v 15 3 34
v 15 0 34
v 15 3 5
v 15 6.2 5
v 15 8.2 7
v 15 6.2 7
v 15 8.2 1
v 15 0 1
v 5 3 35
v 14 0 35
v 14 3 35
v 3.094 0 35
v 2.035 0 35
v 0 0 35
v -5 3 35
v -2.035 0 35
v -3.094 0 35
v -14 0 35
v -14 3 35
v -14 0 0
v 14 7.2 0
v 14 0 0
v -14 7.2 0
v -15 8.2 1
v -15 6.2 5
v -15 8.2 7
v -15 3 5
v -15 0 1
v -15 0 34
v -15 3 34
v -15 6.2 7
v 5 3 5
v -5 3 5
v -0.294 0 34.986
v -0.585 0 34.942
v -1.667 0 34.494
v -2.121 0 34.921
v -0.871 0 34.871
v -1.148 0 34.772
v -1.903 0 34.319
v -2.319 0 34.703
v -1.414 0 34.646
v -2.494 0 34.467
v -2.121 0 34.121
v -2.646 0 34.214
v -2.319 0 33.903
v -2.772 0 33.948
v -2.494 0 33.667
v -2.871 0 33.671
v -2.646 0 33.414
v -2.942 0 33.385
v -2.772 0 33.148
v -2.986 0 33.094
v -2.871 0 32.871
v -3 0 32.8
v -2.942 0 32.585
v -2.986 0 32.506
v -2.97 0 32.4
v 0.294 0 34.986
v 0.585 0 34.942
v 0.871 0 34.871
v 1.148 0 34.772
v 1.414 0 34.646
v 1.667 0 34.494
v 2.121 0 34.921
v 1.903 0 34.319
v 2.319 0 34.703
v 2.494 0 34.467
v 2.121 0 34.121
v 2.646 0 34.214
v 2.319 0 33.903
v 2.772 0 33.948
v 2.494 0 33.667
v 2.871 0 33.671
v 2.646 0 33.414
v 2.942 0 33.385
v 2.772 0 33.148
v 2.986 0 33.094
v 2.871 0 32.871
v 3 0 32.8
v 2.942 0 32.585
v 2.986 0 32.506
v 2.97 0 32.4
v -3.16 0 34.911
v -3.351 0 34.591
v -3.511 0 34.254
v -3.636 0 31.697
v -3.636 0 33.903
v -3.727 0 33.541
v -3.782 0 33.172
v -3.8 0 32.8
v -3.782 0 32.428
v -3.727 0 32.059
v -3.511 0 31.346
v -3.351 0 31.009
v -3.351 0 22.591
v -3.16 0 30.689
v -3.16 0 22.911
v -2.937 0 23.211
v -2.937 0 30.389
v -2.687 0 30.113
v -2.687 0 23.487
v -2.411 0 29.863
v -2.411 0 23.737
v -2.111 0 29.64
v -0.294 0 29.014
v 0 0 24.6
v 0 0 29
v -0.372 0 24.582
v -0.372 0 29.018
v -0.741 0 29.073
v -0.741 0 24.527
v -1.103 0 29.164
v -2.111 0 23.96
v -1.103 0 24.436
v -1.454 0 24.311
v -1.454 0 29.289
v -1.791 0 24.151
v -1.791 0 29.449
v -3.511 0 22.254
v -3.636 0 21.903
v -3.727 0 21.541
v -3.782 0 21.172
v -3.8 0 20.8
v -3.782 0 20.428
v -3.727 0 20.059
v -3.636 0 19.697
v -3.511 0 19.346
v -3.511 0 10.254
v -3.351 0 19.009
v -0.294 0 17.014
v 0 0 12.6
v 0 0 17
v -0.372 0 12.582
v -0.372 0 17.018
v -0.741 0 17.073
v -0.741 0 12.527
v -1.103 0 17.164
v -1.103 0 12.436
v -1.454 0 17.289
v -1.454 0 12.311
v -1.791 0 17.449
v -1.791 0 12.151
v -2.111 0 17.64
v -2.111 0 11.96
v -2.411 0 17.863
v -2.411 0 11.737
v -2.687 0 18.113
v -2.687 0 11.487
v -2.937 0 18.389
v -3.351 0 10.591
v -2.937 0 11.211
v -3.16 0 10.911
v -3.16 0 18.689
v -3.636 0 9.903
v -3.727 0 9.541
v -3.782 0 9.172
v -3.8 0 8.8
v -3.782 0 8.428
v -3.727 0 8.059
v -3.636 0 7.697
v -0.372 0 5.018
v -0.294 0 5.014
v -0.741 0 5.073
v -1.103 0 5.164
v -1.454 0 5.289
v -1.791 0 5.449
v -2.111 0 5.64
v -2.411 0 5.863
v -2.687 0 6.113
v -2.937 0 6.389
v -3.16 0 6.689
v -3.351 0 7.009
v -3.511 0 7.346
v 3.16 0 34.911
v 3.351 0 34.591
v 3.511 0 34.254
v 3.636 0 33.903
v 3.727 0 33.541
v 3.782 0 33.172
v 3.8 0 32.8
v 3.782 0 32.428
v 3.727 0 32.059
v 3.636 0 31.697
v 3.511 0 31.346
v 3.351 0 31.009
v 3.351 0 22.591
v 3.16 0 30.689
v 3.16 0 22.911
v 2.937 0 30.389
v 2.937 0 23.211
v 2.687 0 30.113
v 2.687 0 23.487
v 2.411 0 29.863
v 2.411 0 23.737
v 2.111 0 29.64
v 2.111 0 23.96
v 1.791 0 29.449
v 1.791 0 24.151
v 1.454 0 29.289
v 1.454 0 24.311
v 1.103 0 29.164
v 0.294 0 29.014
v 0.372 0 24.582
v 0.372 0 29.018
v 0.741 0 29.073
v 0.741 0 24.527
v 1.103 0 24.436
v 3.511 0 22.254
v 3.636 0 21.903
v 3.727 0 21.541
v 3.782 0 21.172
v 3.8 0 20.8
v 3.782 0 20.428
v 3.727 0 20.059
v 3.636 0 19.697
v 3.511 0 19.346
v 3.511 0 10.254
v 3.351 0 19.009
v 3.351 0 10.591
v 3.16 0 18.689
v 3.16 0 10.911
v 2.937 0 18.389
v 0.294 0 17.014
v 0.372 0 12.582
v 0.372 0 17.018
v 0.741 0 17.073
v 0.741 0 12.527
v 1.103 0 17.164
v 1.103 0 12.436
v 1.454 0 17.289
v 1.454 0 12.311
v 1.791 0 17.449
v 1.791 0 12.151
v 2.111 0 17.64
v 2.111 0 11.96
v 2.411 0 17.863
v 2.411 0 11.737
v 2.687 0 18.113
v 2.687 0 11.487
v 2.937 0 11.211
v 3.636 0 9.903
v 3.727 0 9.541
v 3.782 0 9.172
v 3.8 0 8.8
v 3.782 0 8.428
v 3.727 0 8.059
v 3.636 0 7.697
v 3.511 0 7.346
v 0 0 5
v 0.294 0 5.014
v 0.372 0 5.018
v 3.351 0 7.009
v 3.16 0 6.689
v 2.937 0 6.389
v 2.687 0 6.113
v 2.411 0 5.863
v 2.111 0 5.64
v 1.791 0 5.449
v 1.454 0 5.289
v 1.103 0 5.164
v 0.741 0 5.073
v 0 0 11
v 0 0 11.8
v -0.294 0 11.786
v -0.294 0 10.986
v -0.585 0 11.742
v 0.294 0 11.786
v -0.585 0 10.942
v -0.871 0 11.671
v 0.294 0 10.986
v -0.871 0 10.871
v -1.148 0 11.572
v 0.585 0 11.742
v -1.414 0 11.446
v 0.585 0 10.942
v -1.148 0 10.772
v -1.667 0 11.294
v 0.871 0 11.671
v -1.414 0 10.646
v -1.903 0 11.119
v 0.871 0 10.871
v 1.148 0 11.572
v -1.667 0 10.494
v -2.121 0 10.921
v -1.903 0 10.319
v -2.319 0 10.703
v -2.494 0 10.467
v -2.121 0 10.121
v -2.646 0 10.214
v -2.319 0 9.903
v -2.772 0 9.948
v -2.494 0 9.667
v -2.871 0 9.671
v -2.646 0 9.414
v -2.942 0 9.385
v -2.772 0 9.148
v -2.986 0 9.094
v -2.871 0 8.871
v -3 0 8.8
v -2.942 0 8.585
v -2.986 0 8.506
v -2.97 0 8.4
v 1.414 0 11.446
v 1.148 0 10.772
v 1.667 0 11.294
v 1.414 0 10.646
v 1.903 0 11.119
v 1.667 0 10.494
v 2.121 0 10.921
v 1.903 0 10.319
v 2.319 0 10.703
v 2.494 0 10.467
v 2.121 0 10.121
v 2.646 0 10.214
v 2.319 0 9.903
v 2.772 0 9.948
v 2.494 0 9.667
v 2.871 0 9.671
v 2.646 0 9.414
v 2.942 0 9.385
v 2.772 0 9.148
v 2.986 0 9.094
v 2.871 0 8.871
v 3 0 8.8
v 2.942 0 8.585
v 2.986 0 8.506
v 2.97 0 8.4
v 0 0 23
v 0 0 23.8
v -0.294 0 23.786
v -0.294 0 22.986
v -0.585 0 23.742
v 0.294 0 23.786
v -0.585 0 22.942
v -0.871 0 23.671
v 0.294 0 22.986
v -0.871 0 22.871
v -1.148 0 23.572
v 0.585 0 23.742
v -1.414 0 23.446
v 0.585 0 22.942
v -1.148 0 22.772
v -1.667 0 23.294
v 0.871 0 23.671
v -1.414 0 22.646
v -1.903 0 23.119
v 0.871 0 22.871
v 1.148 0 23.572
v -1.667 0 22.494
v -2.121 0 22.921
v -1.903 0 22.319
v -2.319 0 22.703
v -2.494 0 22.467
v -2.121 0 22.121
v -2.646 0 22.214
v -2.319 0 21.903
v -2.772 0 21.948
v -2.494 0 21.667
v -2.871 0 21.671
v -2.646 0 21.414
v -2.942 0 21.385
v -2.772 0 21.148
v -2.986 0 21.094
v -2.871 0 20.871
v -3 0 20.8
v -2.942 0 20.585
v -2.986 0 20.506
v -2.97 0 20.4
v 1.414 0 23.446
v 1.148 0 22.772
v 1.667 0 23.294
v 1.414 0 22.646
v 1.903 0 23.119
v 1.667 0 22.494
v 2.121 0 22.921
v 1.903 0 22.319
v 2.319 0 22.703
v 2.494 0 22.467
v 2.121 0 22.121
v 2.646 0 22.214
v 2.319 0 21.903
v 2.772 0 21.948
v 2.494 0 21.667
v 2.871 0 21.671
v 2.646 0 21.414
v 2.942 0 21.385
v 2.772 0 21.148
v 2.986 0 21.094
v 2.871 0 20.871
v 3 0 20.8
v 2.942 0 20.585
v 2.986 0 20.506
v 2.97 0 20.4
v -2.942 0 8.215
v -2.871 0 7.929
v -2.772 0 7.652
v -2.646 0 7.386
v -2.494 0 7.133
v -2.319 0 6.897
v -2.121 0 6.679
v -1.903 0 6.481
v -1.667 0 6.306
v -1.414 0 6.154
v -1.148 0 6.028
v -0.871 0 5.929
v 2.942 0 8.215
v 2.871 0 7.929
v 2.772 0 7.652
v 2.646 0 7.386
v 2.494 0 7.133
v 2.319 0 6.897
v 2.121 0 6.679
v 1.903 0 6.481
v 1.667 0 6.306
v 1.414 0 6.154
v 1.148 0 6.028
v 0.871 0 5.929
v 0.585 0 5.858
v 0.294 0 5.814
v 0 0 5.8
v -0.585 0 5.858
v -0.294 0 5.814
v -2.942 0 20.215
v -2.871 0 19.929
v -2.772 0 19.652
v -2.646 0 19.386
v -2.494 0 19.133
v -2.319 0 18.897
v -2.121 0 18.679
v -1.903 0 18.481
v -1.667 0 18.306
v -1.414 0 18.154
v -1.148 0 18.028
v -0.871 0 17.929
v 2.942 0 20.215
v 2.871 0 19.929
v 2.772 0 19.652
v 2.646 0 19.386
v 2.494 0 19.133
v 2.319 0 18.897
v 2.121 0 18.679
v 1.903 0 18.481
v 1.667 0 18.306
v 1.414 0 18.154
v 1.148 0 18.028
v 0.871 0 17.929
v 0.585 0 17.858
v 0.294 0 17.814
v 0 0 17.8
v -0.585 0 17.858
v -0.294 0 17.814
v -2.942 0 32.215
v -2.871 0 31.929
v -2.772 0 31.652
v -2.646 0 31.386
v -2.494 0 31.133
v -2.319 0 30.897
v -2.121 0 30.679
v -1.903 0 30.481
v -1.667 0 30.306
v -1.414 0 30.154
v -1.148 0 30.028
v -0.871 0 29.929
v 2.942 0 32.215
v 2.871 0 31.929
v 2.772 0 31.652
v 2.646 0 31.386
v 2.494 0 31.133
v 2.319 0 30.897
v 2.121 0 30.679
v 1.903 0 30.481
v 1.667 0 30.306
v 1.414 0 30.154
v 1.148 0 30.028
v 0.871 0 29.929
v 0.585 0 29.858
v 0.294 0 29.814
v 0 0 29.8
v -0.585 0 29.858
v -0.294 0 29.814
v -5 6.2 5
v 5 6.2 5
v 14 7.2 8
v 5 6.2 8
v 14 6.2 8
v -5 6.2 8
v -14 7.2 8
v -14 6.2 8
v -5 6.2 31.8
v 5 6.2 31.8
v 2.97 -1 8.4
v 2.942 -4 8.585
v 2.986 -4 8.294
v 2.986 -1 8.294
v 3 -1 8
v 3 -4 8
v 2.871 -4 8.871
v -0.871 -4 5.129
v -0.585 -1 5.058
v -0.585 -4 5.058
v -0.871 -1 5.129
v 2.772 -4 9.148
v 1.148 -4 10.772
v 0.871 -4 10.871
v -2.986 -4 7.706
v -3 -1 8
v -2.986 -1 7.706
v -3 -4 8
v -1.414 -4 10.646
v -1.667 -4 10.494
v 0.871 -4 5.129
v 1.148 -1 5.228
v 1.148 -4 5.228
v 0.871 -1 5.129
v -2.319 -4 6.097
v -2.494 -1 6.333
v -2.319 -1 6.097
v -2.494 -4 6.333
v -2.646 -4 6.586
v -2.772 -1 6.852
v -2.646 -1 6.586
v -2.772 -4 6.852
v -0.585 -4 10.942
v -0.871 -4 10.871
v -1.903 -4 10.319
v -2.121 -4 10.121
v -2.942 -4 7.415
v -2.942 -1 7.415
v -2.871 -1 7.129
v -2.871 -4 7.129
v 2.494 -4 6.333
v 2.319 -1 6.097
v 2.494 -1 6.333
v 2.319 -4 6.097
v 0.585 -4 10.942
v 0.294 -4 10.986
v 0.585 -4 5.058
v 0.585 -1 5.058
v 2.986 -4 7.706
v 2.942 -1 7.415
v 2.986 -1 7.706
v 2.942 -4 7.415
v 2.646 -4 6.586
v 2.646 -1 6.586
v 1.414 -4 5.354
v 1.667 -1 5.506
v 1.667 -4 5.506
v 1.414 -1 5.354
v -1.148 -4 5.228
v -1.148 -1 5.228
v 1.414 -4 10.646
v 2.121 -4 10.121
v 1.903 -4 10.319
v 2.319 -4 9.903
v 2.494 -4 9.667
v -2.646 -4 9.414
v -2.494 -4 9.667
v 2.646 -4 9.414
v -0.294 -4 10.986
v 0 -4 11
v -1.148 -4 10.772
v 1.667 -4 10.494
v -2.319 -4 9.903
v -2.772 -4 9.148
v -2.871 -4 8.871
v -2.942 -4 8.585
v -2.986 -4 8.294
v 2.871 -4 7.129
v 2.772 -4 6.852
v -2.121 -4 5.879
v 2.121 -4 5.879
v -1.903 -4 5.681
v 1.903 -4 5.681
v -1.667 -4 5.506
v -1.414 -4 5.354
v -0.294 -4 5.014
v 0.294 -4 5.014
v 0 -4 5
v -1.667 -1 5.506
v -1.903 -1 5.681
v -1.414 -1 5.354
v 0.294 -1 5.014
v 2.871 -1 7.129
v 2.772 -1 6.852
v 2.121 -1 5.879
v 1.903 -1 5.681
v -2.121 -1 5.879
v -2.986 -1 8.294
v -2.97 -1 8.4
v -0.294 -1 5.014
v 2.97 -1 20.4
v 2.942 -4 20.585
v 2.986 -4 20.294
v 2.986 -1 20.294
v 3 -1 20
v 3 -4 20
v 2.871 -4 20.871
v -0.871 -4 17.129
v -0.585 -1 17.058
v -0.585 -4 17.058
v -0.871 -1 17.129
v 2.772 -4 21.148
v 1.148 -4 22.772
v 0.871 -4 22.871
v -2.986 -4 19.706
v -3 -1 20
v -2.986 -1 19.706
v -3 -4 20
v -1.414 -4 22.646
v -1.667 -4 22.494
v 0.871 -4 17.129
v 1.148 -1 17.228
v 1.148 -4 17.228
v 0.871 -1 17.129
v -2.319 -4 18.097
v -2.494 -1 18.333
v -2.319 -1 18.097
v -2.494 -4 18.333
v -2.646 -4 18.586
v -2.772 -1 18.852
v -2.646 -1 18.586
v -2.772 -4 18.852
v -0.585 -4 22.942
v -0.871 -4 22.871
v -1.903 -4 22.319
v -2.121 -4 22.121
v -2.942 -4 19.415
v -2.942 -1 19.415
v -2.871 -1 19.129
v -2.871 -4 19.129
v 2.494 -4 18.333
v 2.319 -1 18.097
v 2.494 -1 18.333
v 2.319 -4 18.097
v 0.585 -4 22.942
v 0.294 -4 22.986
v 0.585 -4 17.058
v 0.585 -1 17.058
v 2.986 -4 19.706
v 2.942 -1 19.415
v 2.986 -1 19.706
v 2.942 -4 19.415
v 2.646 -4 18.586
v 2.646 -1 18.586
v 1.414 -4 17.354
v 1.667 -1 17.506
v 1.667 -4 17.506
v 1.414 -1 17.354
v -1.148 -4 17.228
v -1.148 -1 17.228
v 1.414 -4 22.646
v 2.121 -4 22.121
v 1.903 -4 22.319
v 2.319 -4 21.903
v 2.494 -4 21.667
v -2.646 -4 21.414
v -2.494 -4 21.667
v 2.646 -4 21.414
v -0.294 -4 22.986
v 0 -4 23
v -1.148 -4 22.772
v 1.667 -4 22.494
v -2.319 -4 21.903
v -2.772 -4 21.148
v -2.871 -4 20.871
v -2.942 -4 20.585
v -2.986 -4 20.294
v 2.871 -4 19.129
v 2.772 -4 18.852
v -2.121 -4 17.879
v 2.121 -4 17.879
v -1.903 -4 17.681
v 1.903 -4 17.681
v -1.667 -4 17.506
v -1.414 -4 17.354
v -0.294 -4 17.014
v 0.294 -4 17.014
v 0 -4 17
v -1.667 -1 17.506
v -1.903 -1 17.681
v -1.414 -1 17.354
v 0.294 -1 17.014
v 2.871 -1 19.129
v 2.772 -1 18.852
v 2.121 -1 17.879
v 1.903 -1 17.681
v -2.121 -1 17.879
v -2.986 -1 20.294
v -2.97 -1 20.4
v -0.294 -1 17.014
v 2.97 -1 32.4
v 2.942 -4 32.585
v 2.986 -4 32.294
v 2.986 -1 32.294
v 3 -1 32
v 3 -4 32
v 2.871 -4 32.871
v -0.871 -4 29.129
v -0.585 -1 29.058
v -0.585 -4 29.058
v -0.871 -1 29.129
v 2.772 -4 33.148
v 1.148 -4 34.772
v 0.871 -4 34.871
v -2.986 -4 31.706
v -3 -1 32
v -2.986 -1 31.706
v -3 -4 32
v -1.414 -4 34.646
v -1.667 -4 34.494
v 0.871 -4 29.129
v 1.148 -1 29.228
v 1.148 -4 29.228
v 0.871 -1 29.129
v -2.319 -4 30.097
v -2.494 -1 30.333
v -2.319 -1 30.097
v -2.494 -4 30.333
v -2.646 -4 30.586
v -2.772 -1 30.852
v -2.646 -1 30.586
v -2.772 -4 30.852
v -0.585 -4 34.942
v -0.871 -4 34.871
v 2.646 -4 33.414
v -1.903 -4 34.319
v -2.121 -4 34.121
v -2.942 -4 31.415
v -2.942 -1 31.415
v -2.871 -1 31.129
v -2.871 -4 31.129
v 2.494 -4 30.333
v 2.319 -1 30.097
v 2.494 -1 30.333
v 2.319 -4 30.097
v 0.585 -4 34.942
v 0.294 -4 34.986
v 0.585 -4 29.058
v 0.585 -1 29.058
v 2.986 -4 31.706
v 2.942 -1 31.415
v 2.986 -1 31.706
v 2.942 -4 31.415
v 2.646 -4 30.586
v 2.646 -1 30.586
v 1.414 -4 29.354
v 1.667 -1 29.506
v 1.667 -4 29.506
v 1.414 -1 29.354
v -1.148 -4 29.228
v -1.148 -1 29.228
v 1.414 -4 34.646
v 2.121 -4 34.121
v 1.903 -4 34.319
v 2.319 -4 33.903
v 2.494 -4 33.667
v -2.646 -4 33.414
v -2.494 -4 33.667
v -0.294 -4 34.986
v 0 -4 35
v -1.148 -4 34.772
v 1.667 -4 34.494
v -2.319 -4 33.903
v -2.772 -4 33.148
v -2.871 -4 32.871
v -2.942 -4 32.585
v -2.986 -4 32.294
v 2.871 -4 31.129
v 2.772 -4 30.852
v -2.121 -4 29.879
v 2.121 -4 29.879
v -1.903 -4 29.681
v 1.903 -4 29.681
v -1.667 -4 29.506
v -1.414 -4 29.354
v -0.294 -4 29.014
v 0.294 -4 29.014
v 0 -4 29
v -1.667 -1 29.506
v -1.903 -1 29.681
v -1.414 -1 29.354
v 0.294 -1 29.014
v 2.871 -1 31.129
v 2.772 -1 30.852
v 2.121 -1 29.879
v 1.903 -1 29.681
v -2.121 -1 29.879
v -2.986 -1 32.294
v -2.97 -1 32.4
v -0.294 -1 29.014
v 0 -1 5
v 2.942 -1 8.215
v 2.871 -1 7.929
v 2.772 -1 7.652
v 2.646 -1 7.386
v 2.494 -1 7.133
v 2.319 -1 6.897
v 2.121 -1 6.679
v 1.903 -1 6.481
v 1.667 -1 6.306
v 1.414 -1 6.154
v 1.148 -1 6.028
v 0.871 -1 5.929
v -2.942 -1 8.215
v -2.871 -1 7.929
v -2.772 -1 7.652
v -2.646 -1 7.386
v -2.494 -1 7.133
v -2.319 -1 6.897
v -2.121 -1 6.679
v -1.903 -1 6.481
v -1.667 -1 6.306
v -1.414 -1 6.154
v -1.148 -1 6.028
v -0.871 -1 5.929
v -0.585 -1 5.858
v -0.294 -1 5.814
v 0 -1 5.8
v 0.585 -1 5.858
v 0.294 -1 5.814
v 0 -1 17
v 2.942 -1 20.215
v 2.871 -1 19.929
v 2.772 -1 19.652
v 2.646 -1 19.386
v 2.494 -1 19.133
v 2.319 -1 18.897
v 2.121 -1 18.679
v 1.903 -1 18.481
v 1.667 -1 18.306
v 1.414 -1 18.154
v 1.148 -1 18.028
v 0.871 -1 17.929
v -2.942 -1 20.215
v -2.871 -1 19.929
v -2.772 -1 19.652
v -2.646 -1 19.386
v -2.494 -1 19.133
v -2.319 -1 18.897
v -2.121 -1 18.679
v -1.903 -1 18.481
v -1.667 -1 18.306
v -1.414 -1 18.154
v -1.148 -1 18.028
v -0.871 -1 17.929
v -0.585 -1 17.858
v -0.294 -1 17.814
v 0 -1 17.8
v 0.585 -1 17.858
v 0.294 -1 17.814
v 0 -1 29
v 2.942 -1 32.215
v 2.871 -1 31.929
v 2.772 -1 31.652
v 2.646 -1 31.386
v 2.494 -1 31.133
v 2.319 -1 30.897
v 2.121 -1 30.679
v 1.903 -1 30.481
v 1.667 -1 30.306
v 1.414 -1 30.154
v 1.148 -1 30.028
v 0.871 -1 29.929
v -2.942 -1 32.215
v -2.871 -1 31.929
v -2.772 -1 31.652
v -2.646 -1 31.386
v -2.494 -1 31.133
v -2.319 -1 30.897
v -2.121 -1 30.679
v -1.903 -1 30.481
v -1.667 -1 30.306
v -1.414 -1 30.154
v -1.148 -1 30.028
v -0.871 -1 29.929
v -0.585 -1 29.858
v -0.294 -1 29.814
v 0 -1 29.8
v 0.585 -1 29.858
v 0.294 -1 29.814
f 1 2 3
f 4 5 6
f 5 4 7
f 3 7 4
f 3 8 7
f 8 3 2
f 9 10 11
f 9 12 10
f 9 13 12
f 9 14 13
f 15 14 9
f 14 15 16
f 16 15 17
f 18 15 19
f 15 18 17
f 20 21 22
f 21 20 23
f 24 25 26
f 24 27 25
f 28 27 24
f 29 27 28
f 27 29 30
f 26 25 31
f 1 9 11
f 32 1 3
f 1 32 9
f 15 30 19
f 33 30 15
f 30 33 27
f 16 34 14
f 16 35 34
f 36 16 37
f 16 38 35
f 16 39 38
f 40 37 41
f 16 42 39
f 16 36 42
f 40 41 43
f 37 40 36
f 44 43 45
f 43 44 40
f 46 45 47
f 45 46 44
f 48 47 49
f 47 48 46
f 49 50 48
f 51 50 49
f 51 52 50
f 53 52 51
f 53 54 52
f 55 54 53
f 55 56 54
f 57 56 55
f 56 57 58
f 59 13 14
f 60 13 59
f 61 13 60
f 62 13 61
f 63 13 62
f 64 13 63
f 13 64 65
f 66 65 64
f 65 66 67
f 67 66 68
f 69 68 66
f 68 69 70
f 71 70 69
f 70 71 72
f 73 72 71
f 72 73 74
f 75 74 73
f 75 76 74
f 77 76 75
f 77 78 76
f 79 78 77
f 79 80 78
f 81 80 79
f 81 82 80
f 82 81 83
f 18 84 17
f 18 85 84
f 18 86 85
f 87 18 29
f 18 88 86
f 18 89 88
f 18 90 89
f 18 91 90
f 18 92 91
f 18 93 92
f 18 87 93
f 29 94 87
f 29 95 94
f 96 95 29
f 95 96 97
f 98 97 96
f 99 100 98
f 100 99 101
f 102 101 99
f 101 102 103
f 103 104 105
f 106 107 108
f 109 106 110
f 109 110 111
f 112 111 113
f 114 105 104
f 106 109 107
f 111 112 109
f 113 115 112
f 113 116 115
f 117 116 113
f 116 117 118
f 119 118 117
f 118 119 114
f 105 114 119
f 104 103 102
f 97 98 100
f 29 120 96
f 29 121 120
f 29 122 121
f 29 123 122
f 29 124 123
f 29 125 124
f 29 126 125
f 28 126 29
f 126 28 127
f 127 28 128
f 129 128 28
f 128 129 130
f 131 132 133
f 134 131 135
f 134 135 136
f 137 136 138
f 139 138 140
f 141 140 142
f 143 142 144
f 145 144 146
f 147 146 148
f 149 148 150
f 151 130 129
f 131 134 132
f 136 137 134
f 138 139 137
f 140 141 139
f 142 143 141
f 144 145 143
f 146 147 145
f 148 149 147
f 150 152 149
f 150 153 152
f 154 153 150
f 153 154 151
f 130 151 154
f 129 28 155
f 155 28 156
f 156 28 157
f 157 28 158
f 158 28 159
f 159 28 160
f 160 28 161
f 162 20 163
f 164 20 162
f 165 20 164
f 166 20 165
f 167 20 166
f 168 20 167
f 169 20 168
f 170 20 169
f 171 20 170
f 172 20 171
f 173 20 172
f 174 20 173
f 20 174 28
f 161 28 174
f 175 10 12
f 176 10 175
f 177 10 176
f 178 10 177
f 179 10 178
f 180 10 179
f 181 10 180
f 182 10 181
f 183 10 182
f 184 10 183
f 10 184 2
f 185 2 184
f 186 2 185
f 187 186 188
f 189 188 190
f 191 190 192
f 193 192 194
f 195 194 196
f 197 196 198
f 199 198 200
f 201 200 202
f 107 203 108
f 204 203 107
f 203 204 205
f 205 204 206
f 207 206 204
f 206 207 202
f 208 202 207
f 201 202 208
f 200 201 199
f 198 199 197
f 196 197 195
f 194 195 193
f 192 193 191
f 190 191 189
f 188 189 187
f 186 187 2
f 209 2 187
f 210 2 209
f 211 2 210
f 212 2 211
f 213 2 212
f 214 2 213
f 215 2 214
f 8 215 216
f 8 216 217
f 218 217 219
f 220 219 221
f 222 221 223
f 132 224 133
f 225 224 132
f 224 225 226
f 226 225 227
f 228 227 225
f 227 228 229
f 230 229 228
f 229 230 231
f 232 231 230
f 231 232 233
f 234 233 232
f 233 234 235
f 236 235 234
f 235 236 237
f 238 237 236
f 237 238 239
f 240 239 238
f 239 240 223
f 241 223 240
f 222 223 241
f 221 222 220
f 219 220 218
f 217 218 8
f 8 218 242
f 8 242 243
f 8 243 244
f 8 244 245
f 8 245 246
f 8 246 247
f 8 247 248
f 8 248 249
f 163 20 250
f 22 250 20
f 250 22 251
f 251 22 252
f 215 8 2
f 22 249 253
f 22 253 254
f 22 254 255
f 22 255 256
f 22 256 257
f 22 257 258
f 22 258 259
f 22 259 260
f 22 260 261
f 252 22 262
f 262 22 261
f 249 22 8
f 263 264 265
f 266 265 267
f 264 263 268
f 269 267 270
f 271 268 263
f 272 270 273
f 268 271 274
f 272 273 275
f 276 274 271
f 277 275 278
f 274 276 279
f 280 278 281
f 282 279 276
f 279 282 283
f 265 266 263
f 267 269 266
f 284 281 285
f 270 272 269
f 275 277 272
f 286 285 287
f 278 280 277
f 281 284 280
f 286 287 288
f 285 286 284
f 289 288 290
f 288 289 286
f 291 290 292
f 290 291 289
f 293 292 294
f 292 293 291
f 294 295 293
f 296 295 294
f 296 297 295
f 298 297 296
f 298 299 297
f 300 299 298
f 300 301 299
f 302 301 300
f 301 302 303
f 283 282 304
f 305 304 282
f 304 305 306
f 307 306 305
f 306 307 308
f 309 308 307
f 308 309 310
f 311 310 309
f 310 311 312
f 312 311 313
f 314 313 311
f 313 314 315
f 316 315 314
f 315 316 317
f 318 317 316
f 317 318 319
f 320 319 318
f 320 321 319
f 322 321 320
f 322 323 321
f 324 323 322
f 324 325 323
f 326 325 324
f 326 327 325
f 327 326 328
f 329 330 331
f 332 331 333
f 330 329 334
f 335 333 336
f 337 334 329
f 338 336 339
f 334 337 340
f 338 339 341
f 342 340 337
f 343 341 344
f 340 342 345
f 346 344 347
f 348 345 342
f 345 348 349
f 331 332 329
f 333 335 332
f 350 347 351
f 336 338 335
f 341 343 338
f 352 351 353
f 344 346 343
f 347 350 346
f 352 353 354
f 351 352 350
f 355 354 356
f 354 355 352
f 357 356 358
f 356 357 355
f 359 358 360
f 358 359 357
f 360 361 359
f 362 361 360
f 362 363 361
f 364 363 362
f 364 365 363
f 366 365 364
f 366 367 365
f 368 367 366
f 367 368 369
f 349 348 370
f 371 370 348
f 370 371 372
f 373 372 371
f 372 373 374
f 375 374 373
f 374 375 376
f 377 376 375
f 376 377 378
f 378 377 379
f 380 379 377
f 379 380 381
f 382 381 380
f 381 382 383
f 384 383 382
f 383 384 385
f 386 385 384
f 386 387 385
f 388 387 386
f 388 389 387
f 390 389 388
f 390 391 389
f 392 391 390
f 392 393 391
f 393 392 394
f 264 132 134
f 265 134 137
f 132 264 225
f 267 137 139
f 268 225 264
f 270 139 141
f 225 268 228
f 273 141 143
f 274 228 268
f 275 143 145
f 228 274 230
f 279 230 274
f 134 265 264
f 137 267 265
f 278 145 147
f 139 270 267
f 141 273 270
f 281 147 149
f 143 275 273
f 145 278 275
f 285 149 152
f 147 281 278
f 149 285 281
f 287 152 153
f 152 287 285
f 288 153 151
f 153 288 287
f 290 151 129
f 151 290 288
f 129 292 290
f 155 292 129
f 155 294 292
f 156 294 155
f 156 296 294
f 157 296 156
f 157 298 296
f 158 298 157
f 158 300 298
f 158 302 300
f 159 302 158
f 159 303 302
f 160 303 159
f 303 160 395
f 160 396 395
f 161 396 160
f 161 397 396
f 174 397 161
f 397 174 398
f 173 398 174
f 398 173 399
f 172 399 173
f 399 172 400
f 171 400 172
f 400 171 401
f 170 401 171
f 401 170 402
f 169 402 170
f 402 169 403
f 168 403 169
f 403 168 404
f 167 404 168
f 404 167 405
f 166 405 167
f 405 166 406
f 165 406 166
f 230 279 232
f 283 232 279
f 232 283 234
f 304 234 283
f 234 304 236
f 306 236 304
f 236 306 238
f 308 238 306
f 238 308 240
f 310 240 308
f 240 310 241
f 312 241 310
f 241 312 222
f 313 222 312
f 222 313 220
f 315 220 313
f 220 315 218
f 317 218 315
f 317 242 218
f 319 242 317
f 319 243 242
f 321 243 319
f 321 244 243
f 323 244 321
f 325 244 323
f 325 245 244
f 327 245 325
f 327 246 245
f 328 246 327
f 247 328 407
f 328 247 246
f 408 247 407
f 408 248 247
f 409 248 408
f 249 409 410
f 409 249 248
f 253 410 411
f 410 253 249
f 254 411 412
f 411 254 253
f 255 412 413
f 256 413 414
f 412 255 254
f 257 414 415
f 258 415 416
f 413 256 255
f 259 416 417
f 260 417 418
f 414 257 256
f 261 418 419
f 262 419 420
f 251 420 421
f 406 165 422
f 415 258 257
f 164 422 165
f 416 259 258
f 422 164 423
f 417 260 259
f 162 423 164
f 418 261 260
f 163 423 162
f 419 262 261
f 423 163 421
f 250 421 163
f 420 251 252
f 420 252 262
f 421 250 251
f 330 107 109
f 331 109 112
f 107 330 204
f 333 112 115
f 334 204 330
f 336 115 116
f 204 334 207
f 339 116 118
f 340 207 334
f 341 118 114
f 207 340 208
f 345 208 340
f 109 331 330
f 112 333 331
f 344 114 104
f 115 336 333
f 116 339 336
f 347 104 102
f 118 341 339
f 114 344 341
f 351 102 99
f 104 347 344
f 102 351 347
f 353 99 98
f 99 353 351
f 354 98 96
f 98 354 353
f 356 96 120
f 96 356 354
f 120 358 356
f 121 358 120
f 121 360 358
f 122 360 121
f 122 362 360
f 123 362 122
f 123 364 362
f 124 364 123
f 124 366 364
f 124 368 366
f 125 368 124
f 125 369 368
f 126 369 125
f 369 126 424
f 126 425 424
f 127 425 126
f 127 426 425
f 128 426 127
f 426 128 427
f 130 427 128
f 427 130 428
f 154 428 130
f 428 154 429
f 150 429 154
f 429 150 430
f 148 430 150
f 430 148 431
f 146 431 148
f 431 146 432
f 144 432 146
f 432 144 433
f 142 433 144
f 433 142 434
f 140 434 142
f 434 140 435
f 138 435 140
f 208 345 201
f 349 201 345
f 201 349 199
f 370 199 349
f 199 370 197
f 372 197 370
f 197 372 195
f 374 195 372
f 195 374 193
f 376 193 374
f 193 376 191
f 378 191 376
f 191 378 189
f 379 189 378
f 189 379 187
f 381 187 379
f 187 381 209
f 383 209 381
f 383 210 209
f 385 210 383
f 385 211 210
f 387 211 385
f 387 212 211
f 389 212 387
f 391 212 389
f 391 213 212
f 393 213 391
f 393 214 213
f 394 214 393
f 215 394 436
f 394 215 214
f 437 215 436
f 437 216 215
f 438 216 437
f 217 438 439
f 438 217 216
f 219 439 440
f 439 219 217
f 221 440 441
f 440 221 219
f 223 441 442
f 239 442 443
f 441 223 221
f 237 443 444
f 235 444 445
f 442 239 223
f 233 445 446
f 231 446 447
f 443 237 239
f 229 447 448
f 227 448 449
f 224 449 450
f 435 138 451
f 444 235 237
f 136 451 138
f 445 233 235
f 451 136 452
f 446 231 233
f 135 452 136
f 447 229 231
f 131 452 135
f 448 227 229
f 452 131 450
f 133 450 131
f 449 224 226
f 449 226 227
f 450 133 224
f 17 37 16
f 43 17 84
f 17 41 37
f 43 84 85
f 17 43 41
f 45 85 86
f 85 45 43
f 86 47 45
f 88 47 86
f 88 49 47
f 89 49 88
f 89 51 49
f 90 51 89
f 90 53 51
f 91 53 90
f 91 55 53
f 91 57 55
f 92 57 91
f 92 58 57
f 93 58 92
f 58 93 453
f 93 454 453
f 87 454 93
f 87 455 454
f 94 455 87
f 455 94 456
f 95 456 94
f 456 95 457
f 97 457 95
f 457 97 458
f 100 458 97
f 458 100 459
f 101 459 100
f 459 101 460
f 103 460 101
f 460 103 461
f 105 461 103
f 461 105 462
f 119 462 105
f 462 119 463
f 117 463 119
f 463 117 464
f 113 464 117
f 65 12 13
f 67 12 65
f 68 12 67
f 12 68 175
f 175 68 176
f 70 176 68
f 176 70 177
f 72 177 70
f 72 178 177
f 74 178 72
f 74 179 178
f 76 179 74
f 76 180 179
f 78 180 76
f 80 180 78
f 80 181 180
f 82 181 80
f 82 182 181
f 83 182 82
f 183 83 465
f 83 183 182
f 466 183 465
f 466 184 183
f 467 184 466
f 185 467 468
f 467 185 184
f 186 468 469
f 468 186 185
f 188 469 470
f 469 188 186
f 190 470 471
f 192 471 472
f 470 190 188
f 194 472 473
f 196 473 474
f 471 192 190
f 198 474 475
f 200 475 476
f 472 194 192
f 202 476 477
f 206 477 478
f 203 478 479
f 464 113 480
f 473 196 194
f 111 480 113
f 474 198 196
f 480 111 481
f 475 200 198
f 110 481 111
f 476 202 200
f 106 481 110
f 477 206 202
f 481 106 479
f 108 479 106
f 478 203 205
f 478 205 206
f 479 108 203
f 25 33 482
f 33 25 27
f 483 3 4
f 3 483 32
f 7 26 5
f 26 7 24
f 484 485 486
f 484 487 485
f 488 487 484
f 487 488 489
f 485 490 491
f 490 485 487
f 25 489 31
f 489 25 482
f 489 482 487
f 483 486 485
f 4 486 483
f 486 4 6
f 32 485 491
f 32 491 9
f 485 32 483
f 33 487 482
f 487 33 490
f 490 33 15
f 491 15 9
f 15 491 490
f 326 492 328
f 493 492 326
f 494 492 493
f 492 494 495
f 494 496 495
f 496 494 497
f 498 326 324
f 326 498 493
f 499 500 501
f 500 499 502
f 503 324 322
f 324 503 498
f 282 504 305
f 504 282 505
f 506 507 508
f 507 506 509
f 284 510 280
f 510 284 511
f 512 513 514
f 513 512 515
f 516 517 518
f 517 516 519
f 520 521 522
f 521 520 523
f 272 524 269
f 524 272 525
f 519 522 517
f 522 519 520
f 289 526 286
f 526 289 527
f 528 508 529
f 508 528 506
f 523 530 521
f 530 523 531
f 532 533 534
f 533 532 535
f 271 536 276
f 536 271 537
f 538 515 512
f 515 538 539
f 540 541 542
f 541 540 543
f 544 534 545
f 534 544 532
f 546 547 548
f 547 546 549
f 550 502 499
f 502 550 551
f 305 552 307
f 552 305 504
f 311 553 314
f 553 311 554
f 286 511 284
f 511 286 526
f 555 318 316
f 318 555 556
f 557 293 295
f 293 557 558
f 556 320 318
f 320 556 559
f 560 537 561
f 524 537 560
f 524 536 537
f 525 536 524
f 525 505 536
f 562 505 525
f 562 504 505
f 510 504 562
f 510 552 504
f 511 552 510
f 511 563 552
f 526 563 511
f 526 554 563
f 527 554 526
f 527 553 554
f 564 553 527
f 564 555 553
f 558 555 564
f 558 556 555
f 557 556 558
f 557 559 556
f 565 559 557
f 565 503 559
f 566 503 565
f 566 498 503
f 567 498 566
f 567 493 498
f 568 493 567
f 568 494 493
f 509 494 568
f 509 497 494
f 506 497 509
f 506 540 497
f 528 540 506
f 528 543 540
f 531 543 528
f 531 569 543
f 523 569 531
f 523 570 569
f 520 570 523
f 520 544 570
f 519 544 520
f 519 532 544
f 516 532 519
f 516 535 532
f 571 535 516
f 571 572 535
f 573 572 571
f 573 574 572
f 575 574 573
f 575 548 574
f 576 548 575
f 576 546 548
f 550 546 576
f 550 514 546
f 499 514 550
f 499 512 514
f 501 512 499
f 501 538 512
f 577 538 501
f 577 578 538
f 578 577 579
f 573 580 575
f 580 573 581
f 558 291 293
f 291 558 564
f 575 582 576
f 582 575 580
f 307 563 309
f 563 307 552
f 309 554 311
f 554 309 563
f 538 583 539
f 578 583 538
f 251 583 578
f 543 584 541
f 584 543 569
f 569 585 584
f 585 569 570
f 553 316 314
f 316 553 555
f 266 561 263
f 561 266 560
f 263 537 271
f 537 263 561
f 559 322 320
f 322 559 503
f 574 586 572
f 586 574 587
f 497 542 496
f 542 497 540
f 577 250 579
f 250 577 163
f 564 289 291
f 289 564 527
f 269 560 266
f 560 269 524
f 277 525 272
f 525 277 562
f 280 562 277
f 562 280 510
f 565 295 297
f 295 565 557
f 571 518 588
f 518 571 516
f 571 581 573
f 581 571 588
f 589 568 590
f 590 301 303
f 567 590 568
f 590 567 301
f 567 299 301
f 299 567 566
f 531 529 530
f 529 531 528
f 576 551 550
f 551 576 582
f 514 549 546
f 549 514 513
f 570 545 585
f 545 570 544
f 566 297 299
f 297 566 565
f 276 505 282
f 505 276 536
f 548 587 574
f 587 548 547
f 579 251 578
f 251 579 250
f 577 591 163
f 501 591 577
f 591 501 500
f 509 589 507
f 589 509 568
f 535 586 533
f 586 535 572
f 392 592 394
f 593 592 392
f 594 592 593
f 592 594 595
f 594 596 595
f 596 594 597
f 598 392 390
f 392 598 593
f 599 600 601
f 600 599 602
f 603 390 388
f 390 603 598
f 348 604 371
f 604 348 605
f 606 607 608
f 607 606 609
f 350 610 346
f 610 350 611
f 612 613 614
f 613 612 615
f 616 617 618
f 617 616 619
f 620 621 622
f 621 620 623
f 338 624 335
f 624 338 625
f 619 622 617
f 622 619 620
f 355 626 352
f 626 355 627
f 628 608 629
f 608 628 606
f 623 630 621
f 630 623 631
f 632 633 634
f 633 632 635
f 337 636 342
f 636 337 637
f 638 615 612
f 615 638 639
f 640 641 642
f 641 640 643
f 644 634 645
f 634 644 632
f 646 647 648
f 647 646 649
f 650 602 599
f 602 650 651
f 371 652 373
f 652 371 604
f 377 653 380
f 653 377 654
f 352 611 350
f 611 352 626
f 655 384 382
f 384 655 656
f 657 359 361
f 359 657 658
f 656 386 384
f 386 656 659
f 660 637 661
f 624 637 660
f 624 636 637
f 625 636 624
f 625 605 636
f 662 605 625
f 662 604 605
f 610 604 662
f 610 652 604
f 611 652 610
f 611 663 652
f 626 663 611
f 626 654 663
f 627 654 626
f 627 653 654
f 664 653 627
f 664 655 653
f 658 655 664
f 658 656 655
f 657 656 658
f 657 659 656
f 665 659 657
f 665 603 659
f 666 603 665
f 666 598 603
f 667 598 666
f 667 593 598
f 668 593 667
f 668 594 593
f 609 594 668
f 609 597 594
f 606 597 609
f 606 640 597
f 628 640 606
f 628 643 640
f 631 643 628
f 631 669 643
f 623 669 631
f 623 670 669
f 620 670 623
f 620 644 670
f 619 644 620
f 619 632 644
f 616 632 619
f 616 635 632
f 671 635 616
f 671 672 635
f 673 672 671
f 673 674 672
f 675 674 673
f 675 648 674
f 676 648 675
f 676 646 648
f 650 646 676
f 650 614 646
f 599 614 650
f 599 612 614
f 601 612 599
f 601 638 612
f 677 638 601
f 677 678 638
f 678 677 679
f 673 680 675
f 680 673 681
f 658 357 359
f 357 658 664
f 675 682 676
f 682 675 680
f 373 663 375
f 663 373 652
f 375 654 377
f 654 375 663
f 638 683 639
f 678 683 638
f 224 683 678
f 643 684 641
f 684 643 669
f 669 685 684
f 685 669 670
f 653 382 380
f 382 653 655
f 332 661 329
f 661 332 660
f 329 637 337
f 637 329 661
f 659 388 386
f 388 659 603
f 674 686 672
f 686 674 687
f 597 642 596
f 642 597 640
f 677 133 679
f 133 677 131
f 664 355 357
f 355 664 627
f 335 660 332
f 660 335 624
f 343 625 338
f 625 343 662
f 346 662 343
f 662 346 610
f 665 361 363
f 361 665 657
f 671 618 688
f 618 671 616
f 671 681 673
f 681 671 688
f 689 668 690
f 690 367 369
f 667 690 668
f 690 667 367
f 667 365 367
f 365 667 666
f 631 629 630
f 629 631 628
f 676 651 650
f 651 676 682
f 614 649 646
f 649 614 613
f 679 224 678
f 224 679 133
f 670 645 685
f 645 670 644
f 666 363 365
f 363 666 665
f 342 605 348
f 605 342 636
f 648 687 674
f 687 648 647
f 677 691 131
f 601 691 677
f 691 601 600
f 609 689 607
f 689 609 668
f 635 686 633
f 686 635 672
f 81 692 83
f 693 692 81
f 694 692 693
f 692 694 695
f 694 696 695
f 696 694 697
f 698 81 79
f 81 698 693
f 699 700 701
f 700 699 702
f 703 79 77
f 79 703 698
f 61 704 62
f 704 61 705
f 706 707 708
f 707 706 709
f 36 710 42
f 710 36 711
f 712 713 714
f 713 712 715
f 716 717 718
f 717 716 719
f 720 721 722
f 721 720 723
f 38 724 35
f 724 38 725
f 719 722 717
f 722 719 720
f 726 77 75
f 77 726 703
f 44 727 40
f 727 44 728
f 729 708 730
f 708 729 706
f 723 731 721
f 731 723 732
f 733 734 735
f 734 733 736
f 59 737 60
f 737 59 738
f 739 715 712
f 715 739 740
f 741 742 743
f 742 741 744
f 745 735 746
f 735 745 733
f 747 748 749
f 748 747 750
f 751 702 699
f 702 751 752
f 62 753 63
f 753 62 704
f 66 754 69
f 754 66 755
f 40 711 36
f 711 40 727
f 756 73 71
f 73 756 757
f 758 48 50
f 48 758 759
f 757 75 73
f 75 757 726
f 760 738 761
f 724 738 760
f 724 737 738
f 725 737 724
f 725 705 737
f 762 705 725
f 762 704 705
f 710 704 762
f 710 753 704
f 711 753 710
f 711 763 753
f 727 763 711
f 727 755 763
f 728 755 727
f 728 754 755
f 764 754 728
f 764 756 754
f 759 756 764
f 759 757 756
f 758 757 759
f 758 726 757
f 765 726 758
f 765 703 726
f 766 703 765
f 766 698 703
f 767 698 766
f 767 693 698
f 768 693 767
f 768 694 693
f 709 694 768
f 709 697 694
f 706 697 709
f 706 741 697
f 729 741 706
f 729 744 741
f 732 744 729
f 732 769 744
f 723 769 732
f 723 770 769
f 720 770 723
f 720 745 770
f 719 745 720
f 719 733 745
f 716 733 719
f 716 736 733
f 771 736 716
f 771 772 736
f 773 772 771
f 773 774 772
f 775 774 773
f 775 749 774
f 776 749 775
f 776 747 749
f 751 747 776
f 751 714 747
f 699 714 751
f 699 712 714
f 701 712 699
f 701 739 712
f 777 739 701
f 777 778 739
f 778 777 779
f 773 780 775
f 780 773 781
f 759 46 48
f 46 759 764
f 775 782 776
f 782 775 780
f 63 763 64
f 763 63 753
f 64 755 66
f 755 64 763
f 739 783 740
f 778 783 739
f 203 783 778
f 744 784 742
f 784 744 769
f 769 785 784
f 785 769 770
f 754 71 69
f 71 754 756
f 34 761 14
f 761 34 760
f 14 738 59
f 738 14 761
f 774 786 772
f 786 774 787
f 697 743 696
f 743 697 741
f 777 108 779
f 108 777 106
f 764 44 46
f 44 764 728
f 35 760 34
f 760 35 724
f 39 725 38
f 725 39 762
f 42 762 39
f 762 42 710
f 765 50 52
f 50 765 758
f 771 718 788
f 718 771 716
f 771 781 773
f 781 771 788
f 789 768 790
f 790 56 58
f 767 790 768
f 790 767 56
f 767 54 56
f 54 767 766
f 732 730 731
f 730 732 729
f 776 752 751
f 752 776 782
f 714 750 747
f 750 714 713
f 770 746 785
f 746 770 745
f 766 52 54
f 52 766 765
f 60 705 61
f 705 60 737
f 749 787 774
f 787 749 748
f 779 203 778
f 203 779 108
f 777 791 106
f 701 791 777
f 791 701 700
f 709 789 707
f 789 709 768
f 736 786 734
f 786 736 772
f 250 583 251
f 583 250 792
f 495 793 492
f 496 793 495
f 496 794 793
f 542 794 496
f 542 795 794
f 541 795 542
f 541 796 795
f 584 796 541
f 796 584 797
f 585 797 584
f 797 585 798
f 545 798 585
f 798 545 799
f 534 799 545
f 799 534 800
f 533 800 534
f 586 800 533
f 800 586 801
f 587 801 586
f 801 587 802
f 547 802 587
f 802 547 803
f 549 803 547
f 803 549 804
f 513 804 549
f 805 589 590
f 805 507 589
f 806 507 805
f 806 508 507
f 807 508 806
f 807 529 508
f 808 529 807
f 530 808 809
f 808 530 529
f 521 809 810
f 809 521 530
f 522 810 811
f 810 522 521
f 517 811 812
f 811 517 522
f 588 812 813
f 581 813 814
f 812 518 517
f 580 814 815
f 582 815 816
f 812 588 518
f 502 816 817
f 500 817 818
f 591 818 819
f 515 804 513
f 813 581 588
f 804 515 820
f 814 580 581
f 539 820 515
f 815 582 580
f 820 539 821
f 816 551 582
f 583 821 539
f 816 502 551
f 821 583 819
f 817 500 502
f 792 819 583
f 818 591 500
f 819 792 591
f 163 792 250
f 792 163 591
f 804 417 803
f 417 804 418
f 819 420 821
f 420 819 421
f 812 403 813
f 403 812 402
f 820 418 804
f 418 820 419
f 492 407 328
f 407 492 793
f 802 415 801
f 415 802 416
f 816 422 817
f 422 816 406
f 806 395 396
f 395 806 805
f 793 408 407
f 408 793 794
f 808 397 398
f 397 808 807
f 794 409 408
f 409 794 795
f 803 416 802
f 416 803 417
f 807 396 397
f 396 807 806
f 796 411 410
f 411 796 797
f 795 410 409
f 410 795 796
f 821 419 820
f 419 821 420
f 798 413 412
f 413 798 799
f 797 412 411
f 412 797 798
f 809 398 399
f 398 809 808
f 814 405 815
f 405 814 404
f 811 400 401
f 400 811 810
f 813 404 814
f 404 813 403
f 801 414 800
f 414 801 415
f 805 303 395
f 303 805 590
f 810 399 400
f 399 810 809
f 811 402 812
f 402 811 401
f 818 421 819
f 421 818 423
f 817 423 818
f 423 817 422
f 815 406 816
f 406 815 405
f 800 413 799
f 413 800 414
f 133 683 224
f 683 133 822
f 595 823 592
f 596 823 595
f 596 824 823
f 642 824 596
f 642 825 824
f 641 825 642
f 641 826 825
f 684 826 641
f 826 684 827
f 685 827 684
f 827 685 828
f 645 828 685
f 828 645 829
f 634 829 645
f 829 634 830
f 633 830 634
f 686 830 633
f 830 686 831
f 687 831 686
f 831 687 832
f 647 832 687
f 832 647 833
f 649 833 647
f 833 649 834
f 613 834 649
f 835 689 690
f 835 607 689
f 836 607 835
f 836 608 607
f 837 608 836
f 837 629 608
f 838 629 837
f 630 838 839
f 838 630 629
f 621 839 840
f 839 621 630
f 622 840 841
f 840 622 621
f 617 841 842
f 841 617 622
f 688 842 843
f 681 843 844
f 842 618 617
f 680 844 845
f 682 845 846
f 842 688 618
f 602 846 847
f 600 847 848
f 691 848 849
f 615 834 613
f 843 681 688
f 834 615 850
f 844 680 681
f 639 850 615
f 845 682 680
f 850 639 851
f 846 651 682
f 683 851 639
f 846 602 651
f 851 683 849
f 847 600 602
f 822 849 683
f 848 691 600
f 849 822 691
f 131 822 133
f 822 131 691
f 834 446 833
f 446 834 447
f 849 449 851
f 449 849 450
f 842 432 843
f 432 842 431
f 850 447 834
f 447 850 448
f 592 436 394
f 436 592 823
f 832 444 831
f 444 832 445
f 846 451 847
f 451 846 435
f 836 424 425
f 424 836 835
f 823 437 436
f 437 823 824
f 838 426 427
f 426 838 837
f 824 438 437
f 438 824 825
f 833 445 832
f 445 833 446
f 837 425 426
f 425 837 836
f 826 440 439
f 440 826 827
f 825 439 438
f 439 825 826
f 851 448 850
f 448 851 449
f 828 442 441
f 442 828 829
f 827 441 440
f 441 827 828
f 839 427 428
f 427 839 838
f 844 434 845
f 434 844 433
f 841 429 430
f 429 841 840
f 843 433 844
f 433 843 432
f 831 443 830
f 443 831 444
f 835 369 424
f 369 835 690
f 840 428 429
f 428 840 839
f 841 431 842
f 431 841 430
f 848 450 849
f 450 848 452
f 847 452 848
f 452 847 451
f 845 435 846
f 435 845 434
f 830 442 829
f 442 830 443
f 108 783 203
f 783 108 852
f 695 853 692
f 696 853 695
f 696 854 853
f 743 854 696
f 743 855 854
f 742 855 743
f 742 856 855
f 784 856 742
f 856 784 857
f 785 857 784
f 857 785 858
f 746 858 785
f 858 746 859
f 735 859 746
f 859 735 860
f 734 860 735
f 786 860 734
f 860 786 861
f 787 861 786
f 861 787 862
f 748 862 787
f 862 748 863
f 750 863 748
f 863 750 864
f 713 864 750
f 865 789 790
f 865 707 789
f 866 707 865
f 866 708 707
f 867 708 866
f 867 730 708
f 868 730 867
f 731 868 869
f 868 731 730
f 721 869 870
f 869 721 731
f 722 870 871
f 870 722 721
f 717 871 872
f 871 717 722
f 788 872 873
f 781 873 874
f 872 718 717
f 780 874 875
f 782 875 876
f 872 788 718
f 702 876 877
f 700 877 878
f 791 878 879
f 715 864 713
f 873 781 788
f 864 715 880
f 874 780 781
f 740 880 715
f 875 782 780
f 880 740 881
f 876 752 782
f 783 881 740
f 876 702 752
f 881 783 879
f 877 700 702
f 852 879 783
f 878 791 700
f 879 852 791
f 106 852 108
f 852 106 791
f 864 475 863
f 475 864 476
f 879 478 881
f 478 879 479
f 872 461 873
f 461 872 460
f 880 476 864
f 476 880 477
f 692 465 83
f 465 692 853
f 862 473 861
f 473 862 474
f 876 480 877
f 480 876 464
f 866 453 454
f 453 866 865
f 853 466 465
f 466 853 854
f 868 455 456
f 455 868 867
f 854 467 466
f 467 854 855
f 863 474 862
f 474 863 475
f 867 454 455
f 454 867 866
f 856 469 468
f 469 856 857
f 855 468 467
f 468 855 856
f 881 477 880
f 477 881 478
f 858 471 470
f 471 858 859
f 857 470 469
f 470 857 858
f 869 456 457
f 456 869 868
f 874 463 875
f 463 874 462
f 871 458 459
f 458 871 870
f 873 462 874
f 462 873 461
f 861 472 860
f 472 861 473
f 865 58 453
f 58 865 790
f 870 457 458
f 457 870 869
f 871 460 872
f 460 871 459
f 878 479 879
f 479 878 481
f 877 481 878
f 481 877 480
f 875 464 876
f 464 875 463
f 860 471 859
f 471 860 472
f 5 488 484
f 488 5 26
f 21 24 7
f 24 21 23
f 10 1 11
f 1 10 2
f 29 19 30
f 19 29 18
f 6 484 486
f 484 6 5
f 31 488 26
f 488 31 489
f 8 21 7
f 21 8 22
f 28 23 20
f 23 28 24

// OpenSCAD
// =====================================================================
// Parametric Vertical Support for Frameless Solar Panels
// Version: 0.45
// =====================================================================

// --- Parameters ---
version = 0.45;

// Panel specifications
panel_thickness = 3.2;       // Thickness of the solar panels (mm)
panel_gap = 10.0;            // Gap between adjacent panels (mm)

// Support body dimensions
support_height = 35.0;       // Total height of the support (mm)
support_width = 30.0;        // Total width of the base plate (mm)

// Single-panel edge configuration (raised center section always stays intact;
// everything left/right of it, including the base plate, is cut away. The
// centerline bosses always remain.)
// "both"  = center support between two panels
// "left"  = support the left panel only, right side cut off
// "right" = support the right panel only, left side cut off
single_side = "both";
base_thickness = 3.0;        // Thickness of the wall mounting base (mm)

// Raised middle section (width matches panel gap = 10mm, thickness matches panel thickness = 3.5mm)
raised_width = panel_gap;
raised_thickness = panel_thickness;
raised_depth = base_thickness + raised_thickness; // Total projection from back wall = 7.5mm

// Panel resting lip & front retention ridge configuration
lip_height = 0.0;            // Vertical height position of the resting lip (at the bottom)
ridge_thickness = 2.0;       // Thickness (depth) of the retention ridge
lip_depth = raised_depth + ridge_thickness; // Total lip depth (9.5mm) so ridge sits right against the central section
lip_thickness = 5.0;         // Thickness of the resting lip (mm)
lip_ridge_height = 3.0;      // Height of the raised lip at the front edge to secure the panel face
ridge_chamfer = 1.0;         // Exact 1mm 45-degree chamfer size for top & bottom outer edges

// Bottom mounting bosses (matched to strip holes: 5.3mm diameter, 10mm apart)
boss_diameter = 6.0;         // Diameter of the locating bosses matching strip holes (mm)
boss_length = 4.0;           // Total length of the boss (embedded + protruding) (mm)
boss_spacing = 12.0;         // Center-to-center distance matching the 10mm hole pitch (mm)
boss_first_z = 8;          // Absolute height (from z=0) of the lowest boss center; subsequent bosses stack upward by boss_spacing

// Off-center round locking groove parameters (positioned at the bottom of each boss base)
groove_thickness = 0.8;      // 0.8 mm thick groove radial width
groove_depth = 1.0;          // 1 mm deep groove into the base
groove_offset = 0.8;         // Off-center shift towards the bottom of the boss base

// Render smoothness
$fn = 64;

// --- Modules ---
module locking_boss(z_pos) {
    translate([0, 0, z_pos])
        rotate([90, 0, 0])
            cylinder(d = boss_diameter, h = boss_length);
}

module locking_groove(z_pos) {
    // Shifted towards the bottom of the boss base (using + groove_offset)
    translate([0, 0, z_pos + groove_offset])
        rotate([90, 0, 0])
            difference() {
                // Outer diameter of the groove ring
                cylinder(d = boss_diameter + (2 * groove_thickness), h = groove_depth);
                // Inner core matching boss diameter
                translate([0, 0, -0.1])
                    cylinder(d = boss_diameter, h = groove_depth + 0.2);
            }
}

module raised_center_section() {
    hull() {
        translate([-raised_width / 2, 0, 0])
            cube([raised_width, raised_depth, support_height - raised_thickness]);

        translate([-raised_width / 2, 0, support_height - 0.1])
            cube([raised_width, base_thickness, 0.1]);
    }
}

module retention_ridge() {
    // Simple block; the top/bottom front chamfers are cut in solar_support()
    translate([-support_width / 2, lip_depth - ridge_thickness, lip_height])
        cube([support_width, ridge_thickness, lip_thickness + lip_ridge_height]);
}

module chamfer_wedge(c, length = support_width + 2) {
    // 45-degree triangular prism centered on the X axis.
    // Legs of length c run along -Y and -Z from the origin.
    rotate([0, 90, 0])
        linear_extrude(center = true, height = length)
            polygon([[0, 0], [0, -c], [c, 0]]);
}

module side_cut() {
    // Keeps only the requested side; cut plane sits at the side faces of the
    // (intact) raised center section
    if (single_side == "left")
        difference() {
            children();
            translate([raised_width / 2, -10, -10])
                cube([support_width, lip_depth + 20, support_height + 20]);
        }
    else if (single_side == "right")
        difference() {
            children();
            translate([-raised_width / 2 - support_width, -10, -10])
                cube([support_width, lip_depth + 20, support_height + 20]);
        }
    else
        children();
}

module solar_support() {
    difference() {
        union() {
            // 1-4. Base plate + panel-facing geometry (cut to one side for
            // single-panel edge use; the raised center section is never cut)
            side_cut() {
                // 1. Main Wall-Mount Base Plate
                translate([-support_width / 2, 0, 0])
                    cube([support_width, base_thickness, support_height]);

                // 3. Horizontal Resting Lip spanning full width
                translate([-support_width / 2, 0, lip_height])
                    cube([support_width, lip_depth, lip_thickness]);

                // 4. Front retention ridge (chamfers cut below)
                retention_ridge();
            }

            // 2. Raised Central Section with 45-degree slope for rain shedding
            // (always intact, also acts as the cut boundary in single-side modes)
            raised_center_section();

            // 5. Locating Bosses starting at boss_first_z, stacked by boss_spacing
            locking_boss(boss_first_z);                    // Lower boss
            locking_boss(boss_first_z + boss_spacing);     // Middle boss
            locking_boss(boss_first_z + 2 * boss_spacing); // Upper boss
        }

        // --- Subtractions for Off-center Locking Grooves at the bottom of each boss ---
        locking_groove(boss_first_z);
        locking_groove(boss_first_z + boss_spacing);
        locking_groove(boss_first_z + 2 * boss_spacing);

        // --- 45-degree chamfers on the front edges of the ridge/lip ---
        // Top front edge of the ridge
        translate([0, lip_depth, lip_height + lip_thickness + lip_ridge_height])
            chamfer_wedge(ridge_chamfer);

        // Bottom front edge (front face of ridge is coplanar with the lip,
        // so the visible bottom chamfer sits at the bottom of the lip)
        translate([0, lip_depth, lip_height])
            mirror([0, 0, 1])
                chamfer_wedge(ridge_chamfer);

        // Top side edges of the base plate (right & left), along its depth
        translate([support_width / 2, base_thickness / 2, support_height])
            rotate([0, 0, -90])
                chamfer_wedge(ridge_chamfer, base_thickness + 2);

        translate([-support_width / 2, base_thickness / 2, support_height])
            rotate([0, 0, 90])
                chamfer_wedge(ridge_chamfer, base_thickness + 2);

        // Top side edges of the ridge (right & left), along the ridge depth
        translate([support_width / 2, lip_depth - ridge_thickness / 2, lip_height + lip_thickness + lip_ridge_height])
            rotate([0, 0, -90])
                chamfer_wedge(ridge_chamfer, ridge_thickness);

        translate([-support_width / 2, lip_depth - ridge_thickness / 2, lip_height + lip_thickness + lip_ridge_height])
            rotate([0, 0, 90])
                chamfer_wedge(ridge_chamfer, ridge_thickness);

        // Bottom side edges (right & left), running along the full lip depth
        translate([support_width / 2, lip_depth / 2, lip_height])
            rotate([0, 0, -90])
                mirror([0, 0, 1])
                    chamfer_wedge(ridge_chamfer, lip_depth + 2);

        translate([-support_width / 2, lip_depth / 2, lip_height])
            rotate([0, 0, 90])
                mirror([0, 0, 1])
                    chamfer_wedge(ridge_chamfer, lip_depth + 2);

        // Bottom edge of the single-side cut plane (matches the side chamfers)
        if (single_side == "left") {
            translate([raised_width / 2, lip_depth / 2, lip_height])
                rotate([0, 0, -90])
                    mirror([0, 0, 1])
                        chamfer_wedge(ridge_chamfer, lip_depth + 2);
            // Top edge of the cut plane (base plate & ridge top)
            translate([raised_width / 2, base_thickness / 2, support_height])
                rotate([0, 0, -90])
                    chamfer_wedge(ridge_chamfer, base_thickness + 2);
            translate([raised_width / 2, lip_depth - ridge_thickness / 2, lip_height + lip_thickness + lip_ridge_height])
                rotate([0, 0, -90])
                    chamfer_wedge(ridge_chamfer, ridge_thickness);
        } else if (single_side == "right") {
            translate([-raised_width / 2, lip_depth / 2, lip_height])
                rotate([0, 0, 90])
                    mirror([0, 0, 1])
                        chamfer_wedge(ridge_chamfer, lip_depth + 2);
            // Top edge of the cut plane (base plate & ridge top)
            translate([-raised_width / 2, base_thickness / 2, support_height])
                rotate([0, 0, 90])
                    chamfer_wedge(ridge_chamfer, base_thickness + 2);
            translate([-raised_width / 2, lip_depth - ridge_thickness / 2, lip_height + lip_thickness + lip_ridge_height])
                rotate([0, 0, 90])
                    chamfer_wedge(ridge_chamfer, ridge_thickness);
        }
    }
}

// --- Render ---
solar_support();

// Display version info in OpenSCAD console
echo(str("Rendering Solar Support Version: ", version));
